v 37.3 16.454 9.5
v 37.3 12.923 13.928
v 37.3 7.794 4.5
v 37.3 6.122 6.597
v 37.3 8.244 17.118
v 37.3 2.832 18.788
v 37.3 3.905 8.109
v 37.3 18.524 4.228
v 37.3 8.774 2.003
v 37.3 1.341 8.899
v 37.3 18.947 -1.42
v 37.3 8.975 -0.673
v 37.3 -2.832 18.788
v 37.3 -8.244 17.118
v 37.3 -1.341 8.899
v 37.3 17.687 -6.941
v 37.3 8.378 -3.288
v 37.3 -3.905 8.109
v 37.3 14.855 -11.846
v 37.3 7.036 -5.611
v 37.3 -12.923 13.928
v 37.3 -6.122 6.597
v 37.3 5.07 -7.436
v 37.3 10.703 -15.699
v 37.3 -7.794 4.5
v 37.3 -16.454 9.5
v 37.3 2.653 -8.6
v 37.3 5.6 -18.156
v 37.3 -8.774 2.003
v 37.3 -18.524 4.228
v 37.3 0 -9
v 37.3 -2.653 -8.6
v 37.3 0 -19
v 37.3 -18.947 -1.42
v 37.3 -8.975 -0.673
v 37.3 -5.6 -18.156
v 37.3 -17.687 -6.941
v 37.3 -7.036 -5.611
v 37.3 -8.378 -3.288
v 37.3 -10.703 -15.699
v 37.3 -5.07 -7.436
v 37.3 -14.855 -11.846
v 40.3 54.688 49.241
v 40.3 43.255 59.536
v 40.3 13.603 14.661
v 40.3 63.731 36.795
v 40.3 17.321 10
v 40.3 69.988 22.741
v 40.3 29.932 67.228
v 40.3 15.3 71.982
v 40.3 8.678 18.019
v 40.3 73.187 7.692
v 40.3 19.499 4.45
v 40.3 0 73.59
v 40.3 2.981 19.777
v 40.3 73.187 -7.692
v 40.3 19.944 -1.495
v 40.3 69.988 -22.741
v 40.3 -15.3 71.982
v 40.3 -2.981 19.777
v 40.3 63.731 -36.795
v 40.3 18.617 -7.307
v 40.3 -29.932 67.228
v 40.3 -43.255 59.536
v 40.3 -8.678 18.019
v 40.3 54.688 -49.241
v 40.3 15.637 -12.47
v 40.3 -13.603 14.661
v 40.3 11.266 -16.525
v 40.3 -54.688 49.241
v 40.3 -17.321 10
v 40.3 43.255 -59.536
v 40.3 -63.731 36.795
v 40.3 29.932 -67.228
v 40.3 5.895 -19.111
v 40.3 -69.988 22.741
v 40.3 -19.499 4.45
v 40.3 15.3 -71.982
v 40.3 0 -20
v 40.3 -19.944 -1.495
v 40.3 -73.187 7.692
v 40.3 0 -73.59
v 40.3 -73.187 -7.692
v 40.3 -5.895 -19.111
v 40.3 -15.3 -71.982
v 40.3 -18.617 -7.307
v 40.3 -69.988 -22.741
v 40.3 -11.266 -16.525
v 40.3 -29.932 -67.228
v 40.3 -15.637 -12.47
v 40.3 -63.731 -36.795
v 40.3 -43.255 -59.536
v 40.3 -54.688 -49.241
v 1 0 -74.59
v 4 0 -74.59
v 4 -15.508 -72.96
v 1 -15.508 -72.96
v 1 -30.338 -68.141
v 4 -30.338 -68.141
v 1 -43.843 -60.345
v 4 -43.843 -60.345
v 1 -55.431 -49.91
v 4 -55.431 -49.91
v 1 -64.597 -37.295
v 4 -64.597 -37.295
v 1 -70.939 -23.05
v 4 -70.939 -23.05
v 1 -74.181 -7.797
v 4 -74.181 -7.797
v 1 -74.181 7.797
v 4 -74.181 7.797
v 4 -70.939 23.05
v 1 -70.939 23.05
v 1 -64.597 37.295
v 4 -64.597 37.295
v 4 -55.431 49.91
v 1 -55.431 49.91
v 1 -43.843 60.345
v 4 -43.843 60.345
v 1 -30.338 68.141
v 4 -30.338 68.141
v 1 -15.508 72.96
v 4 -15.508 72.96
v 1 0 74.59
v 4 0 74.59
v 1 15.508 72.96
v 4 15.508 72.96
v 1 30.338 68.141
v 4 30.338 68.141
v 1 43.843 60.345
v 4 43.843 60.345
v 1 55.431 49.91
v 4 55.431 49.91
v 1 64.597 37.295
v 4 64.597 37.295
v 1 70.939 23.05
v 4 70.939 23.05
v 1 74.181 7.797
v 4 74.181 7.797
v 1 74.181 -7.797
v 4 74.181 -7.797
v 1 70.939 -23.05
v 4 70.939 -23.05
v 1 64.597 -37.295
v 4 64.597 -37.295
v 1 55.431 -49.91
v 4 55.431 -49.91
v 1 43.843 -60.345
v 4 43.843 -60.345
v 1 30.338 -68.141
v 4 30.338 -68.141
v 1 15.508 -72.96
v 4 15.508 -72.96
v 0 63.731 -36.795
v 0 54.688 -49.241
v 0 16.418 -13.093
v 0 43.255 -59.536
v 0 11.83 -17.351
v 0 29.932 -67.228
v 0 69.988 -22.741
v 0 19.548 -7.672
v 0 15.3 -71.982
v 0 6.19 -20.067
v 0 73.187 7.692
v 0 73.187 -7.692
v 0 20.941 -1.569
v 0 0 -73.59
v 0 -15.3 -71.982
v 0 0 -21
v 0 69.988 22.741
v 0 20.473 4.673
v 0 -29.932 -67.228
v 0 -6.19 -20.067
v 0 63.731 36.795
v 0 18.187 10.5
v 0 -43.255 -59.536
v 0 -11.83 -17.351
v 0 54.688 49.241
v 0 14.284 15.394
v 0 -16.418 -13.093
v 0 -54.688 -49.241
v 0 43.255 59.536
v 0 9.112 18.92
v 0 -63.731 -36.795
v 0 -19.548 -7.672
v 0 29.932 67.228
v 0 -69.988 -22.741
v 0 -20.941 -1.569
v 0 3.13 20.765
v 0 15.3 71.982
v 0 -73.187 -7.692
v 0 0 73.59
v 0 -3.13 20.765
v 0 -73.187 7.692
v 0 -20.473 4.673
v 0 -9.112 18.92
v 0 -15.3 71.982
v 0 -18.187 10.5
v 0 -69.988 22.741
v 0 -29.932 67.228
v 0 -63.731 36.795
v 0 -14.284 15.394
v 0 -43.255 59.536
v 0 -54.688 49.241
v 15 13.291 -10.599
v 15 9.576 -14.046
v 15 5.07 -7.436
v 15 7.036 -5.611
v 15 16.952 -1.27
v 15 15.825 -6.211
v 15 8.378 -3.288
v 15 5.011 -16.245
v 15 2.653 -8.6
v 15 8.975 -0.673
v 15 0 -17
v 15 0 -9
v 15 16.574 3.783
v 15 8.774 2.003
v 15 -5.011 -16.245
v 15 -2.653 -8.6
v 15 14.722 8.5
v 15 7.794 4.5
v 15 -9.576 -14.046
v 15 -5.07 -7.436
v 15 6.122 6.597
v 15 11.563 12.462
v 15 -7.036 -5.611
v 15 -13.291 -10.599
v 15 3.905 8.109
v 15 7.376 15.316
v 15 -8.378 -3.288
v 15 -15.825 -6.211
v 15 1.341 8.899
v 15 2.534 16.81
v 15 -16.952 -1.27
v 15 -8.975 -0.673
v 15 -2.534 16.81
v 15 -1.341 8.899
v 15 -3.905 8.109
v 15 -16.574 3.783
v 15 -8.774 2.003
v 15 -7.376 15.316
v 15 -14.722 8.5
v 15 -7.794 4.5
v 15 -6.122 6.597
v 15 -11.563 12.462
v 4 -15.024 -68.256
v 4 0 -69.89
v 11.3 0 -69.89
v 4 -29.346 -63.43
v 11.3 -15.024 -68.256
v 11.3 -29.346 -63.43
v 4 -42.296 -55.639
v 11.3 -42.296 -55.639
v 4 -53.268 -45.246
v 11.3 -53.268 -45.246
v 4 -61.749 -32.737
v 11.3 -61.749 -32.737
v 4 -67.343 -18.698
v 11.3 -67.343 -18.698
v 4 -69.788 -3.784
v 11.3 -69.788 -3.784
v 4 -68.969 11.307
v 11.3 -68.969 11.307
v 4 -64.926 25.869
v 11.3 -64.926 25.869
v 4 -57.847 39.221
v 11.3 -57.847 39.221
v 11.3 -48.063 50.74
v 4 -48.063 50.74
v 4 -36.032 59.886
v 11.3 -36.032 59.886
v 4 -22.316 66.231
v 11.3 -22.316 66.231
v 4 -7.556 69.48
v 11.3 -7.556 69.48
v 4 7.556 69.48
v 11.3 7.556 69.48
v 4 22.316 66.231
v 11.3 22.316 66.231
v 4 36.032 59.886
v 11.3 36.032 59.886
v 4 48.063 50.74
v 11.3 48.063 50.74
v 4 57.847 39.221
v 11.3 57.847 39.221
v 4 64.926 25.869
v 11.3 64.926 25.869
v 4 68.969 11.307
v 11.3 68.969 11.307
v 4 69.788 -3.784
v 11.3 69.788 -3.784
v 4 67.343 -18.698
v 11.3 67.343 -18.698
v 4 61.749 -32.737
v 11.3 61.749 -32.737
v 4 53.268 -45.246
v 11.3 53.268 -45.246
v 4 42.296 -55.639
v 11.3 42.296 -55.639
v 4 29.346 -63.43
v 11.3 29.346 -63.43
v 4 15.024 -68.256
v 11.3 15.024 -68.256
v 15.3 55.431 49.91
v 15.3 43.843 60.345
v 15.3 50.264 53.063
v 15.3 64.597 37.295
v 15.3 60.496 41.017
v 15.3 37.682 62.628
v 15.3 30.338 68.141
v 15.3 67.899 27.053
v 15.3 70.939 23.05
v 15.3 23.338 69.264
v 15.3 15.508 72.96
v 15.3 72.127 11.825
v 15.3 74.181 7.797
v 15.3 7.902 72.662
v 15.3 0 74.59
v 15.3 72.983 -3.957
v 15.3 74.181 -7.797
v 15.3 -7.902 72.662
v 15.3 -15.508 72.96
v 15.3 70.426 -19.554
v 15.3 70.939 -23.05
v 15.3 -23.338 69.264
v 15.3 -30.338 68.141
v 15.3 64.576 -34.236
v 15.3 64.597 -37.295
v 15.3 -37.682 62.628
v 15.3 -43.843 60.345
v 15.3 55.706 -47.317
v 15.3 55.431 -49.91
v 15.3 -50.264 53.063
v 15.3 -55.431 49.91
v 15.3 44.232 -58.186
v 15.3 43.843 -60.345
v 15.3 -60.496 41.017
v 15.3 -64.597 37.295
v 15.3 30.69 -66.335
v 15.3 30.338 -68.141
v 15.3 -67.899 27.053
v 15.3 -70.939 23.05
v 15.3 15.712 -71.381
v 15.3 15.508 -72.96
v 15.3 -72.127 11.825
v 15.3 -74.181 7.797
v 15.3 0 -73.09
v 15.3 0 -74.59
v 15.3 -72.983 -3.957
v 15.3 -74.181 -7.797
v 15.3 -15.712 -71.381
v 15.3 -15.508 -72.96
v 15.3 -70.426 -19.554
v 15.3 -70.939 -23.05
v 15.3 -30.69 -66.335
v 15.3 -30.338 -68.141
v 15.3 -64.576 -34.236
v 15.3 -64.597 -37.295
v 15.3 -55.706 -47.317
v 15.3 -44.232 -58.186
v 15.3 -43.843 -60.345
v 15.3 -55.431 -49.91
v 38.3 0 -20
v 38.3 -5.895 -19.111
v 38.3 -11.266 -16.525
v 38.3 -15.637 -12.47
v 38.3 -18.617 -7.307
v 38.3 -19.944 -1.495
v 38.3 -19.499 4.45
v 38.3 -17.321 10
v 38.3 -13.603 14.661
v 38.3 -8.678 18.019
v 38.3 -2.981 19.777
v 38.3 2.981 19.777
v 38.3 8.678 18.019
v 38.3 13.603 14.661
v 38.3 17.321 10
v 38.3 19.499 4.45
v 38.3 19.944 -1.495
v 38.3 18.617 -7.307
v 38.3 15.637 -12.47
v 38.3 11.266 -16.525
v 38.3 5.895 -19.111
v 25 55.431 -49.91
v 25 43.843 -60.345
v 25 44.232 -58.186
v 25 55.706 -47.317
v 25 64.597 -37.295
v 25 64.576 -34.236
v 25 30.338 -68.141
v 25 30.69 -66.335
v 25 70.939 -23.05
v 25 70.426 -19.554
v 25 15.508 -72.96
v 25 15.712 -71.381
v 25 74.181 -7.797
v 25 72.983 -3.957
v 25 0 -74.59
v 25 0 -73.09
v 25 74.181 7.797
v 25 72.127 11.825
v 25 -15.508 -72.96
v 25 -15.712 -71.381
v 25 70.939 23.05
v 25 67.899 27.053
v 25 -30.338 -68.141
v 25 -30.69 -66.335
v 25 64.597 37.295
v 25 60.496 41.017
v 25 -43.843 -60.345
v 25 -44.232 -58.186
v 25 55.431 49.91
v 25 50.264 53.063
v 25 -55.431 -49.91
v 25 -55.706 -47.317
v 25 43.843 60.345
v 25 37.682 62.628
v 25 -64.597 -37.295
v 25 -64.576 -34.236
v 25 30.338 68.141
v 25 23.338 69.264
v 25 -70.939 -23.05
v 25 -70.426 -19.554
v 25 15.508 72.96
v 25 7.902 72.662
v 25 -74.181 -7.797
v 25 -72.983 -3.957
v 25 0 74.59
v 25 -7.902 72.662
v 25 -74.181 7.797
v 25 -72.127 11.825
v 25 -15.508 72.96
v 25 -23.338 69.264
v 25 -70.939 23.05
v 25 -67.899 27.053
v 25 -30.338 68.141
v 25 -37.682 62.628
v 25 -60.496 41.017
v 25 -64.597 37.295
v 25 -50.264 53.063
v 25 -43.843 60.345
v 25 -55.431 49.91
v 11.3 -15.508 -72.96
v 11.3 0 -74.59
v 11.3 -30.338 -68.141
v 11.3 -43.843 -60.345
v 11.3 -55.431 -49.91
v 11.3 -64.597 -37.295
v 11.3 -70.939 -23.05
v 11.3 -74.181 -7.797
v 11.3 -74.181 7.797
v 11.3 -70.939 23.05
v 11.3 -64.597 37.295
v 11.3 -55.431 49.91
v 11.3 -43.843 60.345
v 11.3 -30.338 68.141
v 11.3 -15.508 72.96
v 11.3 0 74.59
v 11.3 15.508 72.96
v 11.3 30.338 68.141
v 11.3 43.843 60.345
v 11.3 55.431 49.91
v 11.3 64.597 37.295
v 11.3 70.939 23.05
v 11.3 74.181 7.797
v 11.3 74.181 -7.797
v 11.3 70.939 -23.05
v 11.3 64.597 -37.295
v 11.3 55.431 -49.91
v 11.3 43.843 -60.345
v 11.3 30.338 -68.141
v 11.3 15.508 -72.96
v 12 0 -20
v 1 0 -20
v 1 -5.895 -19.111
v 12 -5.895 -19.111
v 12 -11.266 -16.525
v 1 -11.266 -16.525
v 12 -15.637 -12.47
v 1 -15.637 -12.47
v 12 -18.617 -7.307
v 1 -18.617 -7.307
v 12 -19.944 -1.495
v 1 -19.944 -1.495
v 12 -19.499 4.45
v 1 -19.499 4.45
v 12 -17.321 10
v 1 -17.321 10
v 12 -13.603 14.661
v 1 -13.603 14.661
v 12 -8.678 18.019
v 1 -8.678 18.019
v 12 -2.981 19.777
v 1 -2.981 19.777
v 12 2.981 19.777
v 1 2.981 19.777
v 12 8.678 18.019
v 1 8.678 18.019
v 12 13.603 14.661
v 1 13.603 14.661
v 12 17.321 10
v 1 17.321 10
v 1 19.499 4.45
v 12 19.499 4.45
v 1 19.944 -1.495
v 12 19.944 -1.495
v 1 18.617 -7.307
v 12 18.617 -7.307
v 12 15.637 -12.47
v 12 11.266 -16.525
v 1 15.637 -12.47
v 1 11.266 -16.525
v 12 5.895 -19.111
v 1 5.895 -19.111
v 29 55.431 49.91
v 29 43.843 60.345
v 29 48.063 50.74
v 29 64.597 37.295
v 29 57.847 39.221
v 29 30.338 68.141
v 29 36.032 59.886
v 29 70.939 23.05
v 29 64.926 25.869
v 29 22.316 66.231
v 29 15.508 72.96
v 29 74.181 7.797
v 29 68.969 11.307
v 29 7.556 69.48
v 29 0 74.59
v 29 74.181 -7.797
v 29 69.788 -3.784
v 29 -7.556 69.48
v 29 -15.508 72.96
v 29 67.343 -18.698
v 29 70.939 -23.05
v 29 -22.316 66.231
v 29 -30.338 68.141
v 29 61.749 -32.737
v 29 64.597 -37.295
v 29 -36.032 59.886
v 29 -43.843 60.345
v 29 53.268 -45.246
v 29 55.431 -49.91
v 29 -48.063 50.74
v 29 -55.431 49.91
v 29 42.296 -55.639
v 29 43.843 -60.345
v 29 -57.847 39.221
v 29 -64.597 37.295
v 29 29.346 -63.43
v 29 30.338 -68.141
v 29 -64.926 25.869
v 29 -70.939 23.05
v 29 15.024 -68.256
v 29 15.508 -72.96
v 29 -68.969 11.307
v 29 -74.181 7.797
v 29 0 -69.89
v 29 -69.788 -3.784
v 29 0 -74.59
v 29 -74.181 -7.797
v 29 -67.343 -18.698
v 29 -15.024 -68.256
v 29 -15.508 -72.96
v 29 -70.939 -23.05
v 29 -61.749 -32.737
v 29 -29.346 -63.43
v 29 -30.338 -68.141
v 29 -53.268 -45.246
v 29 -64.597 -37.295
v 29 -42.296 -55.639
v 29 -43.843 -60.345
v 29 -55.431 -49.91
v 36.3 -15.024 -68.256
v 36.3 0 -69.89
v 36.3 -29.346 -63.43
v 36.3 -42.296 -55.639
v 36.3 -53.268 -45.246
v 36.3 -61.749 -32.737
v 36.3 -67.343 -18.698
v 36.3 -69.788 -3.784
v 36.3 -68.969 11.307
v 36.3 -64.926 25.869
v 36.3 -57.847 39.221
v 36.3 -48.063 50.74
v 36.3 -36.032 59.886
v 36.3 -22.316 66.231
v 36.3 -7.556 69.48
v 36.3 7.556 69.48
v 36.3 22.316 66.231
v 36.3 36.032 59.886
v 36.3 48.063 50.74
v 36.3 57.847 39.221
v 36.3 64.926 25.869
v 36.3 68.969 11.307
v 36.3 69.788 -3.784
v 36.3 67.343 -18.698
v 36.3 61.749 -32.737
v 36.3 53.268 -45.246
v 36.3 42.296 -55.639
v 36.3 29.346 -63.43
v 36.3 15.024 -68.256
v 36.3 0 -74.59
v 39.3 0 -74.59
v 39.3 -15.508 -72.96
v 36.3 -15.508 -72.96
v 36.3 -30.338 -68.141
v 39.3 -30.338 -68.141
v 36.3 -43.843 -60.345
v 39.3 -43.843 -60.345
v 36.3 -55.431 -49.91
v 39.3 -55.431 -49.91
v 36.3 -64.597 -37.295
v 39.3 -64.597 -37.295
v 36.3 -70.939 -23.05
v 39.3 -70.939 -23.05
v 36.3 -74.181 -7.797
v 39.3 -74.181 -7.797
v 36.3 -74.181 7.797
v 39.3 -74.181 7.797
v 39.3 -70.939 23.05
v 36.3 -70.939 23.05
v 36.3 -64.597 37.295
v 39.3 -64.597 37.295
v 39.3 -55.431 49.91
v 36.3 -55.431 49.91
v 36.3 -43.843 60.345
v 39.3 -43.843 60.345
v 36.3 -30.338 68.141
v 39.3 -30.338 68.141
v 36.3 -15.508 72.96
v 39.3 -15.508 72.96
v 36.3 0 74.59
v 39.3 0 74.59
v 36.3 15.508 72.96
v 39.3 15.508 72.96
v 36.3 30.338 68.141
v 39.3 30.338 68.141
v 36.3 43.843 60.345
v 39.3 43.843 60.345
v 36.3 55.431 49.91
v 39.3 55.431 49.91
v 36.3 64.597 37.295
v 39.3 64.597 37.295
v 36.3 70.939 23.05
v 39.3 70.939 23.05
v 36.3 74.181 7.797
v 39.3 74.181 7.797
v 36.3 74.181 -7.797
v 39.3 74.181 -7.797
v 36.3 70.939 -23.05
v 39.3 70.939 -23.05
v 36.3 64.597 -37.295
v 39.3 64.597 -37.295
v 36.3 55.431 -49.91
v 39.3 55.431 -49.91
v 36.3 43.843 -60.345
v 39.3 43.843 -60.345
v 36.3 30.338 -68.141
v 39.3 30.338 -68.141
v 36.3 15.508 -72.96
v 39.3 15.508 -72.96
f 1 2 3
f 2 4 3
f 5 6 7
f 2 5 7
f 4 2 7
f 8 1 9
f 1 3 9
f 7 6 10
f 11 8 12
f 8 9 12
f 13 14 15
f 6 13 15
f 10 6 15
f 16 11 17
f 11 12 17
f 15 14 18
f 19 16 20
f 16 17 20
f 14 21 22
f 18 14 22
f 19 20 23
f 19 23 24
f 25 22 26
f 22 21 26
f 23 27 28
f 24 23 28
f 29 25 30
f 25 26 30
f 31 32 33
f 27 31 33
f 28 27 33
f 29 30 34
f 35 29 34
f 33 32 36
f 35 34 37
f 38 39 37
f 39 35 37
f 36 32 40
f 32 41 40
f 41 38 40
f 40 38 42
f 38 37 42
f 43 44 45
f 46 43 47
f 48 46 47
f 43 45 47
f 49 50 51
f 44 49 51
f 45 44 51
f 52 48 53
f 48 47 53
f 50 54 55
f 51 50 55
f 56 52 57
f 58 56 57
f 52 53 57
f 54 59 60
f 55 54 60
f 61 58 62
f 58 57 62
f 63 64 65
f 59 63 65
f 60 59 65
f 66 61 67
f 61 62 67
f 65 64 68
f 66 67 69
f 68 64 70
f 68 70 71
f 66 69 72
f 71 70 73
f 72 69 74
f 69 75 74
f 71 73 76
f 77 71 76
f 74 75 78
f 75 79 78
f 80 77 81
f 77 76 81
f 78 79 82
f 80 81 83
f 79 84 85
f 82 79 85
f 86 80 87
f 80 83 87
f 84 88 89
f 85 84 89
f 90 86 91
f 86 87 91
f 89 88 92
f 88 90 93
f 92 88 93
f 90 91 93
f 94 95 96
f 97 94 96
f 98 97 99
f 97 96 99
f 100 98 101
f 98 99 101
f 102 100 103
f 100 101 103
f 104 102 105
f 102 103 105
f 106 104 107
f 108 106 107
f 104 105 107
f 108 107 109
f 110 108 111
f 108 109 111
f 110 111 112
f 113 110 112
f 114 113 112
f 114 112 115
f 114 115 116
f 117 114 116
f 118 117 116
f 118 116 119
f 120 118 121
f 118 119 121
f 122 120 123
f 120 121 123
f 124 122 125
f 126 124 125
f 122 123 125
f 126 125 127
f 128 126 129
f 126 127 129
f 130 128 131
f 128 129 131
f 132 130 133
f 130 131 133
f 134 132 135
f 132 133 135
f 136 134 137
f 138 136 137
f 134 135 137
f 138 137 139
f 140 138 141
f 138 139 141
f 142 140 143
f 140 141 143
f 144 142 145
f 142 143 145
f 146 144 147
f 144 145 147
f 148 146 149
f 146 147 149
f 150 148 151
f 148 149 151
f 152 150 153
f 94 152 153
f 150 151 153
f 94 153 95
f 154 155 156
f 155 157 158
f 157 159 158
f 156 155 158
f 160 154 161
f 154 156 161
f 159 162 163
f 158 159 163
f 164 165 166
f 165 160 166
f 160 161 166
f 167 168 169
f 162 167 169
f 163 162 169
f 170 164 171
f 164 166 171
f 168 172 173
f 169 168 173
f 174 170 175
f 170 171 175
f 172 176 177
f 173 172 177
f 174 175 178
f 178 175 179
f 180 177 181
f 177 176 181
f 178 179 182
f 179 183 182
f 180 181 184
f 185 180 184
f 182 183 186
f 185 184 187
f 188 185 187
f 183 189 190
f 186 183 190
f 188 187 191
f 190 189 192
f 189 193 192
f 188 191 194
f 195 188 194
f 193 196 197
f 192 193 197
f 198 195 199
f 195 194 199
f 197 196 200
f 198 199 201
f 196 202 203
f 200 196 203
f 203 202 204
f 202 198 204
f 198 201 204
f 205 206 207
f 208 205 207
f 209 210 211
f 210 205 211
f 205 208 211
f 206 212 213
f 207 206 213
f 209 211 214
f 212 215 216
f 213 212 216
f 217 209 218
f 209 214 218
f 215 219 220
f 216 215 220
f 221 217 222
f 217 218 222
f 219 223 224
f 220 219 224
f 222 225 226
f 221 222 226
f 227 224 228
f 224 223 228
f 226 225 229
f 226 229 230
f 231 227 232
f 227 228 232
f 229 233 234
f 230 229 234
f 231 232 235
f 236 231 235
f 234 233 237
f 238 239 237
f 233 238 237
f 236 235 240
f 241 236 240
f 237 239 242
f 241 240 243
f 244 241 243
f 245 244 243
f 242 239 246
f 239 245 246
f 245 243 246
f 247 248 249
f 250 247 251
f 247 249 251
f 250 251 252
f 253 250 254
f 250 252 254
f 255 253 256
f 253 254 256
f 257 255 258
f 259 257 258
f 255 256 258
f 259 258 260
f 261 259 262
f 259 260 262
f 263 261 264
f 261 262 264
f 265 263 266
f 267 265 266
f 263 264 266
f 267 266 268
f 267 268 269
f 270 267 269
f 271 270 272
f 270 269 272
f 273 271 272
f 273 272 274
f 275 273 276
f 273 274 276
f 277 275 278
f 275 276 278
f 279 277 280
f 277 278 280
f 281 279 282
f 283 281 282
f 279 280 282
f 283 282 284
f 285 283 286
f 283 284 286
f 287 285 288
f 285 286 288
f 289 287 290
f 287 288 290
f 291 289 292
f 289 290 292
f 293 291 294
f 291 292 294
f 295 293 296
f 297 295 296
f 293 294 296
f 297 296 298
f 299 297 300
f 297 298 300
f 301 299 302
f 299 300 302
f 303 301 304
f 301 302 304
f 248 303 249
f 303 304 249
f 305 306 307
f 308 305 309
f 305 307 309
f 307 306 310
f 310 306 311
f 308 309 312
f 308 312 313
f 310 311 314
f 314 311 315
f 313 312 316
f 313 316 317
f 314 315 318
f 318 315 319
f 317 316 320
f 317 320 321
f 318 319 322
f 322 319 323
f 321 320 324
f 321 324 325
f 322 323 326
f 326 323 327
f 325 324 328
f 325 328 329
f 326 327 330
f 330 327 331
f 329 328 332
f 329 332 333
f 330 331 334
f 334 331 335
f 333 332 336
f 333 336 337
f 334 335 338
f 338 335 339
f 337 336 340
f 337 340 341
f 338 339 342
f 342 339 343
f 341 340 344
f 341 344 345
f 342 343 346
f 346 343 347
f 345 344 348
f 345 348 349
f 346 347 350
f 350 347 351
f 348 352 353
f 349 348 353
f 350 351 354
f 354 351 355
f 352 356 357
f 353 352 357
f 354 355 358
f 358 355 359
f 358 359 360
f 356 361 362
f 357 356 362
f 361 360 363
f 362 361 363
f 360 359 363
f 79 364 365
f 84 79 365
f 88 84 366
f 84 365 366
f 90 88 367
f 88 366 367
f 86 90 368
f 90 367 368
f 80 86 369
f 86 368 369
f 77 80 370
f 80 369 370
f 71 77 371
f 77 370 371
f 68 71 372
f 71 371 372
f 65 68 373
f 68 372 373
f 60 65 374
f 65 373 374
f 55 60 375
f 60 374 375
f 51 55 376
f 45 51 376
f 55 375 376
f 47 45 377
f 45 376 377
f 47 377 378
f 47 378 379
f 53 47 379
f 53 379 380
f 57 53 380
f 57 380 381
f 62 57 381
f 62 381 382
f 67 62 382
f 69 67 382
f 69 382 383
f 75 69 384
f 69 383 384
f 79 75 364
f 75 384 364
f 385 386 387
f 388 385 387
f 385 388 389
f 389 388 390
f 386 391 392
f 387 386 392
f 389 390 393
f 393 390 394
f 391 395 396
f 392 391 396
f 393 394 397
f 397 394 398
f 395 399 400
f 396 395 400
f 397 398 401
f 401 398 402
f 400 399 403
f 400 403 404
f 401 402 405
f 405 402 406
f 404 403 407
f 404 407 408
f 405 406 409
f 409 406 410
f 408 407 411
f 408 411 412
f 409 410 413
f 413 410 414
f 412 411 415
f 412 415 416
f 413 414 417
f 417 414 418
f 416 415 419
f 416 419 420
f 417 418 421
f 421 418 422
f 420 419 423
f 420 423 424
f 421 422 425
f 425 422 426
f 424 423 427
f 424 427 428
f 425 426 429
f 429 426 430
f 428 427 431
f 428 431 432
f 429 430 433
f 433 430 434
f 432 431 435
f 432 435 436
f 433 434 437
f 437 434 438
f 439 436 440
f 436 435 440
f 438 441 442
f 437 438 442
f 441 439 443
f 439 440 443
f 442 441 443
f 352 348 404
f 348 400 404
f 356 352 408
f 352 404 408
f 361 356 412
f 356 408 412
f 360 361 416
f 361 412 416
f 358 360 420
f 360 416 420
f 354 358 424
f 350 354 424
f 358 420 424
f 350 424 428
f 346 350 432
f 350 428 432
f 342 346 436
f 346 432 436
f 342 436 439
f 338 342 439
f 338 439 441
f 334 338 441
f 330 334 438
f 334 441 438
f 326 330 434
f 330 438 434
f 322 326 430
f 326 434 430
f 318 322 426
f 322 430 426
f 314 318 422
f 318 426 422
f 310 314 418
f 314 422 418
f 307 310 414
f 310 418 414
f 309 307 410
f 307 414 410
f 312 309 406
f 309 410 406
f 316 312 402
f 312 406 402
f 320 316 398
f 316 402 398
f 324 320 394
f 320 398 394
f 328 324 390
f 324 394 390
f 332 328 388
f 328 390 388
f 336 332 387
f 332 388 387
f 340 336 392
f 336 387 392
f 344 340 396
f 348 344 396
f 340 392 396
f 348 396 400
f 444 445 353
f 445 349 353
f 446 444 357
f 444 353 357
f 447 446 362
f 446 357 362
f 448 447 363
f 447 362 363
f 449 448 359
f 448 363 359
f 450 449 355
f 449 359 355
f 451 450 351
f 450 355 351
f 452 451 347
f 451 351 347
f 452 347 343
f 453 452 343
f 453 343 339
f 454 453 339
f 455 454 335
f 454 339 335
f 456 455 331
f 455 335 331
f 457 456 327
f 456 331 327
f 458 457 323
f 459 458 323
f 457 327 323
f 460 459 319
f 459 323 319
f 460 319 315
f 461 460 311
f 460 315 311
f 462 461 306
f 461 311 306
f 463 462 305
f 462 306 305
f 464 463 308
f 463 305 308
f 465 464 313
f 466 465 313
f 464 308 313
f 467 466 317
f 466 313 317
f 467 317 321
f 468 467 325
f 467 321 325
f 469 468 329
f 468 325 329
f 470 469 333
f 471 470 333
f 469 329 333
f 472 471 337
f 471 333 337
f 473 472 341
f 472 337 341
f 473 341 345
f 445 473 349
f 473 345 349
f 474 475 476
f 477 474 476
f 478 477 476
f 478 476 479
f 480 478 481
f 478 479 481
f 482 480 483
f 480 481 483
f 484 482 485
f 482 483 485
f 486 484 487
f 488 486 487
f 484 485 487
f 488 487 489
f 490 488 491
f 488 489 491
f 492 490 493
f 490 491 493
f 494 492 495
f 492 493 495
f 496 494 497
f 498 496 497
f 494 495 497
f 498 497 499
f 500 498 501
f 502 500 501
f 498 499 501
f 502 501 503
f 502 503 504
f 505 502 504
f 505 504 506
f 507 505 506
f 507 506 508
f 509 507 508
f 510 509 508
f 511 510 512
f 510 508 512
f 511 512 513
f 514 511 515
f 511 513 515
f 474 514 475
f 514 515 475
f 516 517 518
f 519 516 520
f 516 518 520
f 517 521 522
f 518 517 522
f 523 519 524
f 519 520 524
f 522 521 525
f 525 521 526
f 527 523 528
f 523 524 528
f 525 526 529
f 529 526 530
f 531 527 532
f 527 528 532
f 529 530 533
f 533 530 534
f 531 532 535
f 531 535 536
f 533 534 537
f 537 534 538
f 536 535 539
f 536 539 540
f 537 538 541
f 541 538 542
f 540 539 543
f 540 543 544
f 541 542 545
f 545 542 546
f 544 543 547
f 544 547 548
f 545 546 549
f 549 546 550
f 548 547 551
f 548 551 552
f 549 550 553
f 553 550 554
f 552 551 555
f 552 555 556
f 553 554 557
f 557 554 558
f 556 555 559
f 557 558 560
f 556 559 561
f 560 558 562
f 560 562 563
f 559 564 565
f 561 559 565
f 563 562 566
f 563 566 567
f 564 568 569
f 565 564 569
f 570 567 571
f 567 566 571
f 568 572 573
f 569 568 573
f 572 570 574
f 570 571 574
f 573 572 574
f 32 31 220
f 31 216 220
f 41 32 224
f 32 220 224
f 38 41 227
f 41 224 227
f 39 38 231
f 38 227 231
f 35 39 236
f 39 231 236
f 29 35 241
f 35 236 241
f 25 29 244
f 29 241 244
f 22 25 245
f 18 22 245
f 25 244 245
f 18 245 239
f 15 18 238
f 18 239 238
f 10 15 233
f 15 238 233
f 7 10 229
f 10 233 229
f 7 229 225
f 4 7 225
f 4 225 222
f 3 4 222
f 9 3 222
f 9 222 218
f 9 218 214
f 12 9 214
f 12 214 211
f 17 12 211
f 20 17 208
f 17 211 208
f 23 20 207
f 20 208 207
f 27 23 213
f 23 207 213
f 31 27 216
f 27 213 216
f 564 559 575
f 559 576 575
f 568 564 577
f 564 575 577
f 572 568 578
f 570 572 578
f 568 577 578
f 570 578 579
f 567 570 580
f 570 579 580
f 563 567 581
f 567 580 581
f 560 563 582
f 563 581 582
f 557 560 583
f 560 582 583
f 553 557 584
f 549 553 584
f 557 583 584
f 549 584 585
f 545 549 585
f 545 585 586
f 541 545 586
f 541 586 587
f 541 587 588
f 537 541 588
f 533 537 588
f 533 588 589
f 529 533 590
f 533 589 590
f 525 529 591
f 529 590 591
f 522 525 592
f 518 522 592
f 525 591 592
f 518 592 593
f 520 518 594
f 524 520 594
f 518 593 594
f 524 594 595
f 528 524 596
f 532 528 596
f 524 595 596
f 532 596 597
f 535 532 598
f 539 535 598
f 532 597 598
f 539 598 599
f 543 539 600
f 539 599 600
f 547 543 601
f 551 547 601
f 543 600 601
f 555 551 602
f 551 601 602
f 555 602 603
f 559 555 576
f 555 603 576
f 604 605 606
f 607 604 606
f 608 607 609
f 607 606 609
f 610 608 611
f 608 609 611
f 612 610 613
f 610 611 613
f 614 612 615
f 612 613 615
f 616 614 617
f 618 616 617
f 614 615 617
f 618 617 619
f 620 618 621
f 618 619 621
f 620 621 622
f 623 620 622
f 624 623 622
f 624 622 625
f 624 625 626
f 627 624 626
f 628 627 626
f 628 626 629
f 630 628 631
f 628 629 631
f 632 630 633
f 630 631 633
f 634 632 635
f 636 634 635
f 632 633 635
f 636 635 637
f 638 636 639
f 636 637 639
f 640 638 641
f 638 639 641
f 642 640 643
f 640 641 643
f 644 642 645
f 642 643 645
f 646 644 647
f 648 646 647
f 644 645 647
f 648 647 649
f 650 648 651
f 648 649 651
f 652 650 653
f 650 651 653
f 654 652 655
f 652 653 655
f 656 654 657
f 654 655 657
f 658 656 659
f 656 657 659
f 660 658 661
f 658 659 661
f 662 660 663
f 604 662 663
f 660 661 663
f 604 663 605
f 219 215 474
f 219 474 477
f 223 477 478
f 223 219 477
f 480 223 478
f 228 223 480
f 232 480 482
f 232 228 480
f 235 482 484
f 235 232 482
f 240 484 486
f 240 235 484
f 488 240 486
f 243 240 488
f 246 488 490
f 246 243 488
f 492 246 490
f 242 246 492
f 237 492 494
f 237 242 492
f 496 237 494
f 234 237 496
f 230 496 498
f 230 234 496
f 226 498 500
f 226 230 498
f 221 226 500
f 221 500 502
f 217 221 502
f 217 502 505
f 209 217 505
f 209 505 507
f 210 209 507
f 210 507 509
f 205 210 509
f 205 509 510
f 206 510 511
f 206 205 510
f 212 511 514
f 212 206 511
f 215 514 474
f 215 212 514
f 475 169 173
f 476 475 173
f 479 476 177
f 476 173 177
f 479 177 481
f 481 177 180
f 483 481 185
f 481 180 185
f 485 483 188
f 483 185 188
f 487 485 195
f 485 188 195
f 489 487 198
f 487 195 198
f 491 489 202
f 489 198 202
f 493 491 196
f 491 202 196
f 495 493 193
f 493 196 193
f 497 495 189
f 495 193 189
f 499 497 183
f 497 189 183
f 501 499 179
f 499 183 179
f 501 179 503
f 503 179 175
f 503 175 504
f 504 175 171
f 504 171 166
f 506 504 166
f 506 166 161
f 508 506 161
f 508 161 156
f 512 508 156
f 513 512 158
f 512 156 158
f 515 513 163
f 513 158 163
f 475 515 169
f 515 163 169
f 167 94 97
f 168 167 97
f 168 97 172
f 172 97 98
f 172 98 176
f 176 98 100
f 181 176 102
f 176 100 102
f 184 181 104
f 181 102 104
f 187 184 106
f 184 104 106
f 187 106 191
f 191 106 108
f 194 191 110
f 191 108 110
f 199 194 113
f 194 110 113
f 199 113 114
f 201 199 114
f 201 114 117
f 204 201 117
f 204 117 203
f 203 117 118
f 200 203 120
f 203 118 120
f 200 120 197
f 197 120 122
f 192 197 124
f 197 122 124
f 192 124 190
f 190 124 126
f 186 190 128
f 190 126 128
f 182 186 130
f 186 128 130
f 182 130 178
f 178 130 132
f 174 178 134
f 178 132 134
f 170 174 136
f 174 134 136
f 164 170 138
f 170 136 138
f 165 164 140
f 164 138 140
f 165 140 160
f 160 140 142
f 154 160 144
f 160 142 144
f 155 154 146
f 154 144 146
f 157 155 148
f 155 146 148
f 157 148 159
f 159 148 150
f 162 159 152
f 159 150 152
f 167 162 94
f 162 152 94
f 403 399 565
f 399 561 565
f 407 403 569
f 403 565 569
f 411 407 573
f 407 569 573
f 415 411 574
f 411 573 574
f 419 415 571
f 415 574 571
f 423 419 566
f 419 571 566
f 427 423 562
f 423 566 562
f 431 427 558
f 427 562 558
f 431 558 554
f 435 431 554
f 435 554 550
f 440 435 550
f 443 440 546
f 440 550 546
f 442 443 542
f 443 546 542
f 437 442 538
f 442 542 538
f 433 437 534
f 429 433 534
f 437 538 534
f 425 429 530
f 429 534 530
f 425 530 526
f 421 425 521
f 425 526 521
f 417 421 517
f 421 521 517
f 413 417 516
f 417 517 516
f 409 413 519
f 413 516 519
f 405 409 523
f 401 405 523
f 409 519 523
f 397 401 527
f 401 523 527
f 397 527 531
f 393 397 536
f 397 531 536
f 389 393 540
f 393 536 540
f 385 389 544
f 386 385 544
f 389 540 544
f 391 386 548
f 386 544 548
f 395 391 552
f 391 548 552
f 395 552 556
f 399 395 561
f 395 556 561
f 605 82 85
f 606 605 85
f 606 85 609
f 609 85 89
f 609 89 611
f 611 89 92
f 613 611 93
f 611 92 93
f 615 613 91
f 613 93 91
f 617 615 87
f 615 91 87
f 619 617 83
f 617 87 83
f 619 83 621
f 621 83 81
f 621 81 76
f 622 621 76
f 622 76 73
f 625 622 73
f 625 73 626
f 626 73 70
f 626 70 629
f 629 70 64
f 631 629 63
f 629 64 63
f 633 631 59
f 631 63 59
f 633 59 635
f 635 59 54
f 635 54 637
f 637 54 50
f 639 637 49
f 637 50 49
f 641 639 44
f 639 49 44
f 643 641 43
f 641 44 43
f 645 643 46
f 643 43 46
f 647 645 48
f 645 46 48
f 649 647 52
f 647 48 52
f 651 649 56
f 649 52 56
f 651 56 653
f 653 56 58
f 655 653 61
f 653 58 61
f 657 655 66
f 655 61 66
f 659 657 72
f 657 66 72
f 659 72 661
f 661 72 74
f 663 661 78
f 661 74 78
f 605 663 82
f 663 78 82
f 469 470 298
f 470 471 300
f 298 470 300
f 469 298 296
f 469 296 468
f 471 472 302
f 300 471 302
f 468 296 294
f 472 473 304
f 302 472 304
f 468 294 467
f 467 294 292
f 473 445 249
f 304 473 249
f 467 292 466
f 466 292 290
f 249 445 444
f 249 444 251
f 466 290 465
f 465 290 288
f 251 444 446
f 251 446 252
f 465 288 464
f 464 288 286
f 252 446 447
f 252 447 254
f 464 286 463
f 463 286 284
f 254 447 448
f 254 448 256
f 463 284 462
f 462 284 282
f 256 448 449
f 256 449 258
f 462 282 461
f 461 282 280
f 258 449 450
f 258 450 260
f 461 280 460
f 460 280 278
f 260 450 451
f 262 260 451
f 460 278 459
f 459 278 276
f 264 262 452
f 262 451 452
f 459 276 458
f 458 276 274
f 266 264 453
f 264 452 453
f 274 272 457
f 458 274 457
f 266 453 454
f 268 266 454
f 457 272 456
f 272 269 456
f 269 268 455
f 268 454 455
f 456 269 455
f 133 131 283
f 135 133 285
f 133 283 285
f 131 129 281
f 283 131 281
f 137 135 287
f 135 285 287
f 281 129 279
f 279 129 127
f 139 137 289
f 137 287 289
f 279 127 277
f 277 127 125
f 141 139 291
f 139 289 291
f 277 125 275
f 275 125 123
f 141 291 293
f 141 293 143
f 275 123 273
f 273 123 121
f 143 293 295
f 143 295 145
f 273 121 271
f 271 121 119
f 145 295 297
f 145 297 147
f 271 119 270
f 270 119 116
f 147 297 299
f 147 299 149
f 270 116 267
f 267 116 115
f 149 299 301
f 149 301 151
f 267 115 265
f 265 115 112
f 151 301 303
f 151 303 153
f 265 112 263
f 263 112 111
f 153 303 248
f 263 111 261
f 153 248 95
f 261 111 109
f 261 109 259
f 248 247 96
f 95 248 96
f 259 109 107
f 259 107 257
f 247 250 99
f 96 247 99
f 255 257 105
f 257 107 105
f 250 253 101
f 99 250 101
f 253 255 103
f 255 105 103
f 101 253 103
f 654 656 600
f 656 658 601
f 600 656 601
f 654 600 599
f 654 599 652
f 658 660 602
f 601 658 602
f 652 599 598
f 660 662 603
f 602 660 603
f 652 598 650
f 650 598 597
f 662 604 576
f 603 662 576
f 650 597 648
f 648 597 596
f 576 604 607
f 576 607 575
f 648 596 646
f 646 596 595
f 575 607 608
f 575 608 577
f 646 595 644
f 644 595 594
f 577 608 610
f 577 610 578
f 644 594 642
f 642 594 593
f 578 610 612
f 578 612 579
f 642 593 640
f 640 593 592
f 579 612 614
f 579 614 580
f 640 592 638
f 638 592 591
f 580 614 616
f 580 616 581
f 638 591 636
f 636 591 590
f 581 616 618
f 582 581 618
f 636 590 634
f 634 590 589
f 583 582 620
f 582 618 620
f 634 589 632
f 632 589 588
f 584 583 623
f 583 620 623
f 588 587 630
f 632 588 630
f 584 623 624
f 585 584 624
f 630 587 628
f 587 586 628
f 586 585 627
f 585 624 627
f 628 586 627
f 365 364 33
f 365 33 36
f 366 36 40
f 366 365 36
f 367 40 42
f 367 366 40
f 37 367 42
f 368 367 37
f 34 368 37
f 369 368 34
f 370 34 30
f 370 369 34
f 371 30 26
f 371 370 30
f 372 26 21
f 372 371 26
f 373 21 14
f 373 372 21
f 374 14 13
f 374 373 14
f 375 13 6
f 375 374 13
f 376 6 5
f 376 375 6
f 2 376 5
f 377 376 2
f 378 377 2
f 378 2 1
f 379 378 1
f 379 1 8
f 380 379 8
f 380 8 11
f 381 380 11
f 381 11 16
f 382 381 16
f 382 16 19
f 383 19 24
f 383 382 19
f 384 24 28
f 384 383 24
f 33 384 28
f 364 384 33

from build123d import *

# Parameters (mm, degrees)
CHAMFER_1_SIZE = 1
CHAMFER_2_SIZE = 3
CHAMFER_3_SIZE = 1


with BuildPart() as part:
    # Эскиз1 → Повернуть1 (revolve)
    with BuildSketch(Plane.XY, mode=Mode.PRIVATE) as revolve_1_sk:
        Polygon((0, 20), (0, 74.59), (4, 74.59), (4, 69.89), (11.3, 69.89), (11.3, 74.59), (15.3, 74.59), (15.3, 73.09), (25, 73.09), (25, 74.59), (29, 74.59), (29, 69.89), (36.3, 69.89), (36.3, 74.59), (40.3, 74.59), (40.3, 20), (37.3, 20), (37.3, 9), (15, 9), (15, 20), align=None)
    revolve(revolve_1_sk.sketch.rotate(Axis((0, 0, 0), (-1, 0, 0)), 90), axis=Axis((0, 0, 0), (-1, 0, 0)))

    # Фаска1
    chamfer_1_edges = [part.edges().sort_by_distance(p)[0] for p in [
        (40.3, 0, 74.59),
        (0, 0, 74.59),
    ]]
    chamfer(chamfer_1_edges, length=CHAMFER_1_SIZE)

    # Фаска2
    chamfer_2_edges = [part.edges().sort_by_distance(p)[0] for p in [
        (15, 0, 20),
    ]]
    chamfer(chamfer_2_edges, length=CHAMFER_2_SIZE)

    # Фаска3
    chamfer_3_edges = [part.edges().sort_by_distance(p)[0] for p in [
        (37.3, 0, 20),
        (0, 0, 20),
    ]]
    chamfer(chamfer_3_edges, length=CHAMFER_3_SIZE)


solid = part.part
